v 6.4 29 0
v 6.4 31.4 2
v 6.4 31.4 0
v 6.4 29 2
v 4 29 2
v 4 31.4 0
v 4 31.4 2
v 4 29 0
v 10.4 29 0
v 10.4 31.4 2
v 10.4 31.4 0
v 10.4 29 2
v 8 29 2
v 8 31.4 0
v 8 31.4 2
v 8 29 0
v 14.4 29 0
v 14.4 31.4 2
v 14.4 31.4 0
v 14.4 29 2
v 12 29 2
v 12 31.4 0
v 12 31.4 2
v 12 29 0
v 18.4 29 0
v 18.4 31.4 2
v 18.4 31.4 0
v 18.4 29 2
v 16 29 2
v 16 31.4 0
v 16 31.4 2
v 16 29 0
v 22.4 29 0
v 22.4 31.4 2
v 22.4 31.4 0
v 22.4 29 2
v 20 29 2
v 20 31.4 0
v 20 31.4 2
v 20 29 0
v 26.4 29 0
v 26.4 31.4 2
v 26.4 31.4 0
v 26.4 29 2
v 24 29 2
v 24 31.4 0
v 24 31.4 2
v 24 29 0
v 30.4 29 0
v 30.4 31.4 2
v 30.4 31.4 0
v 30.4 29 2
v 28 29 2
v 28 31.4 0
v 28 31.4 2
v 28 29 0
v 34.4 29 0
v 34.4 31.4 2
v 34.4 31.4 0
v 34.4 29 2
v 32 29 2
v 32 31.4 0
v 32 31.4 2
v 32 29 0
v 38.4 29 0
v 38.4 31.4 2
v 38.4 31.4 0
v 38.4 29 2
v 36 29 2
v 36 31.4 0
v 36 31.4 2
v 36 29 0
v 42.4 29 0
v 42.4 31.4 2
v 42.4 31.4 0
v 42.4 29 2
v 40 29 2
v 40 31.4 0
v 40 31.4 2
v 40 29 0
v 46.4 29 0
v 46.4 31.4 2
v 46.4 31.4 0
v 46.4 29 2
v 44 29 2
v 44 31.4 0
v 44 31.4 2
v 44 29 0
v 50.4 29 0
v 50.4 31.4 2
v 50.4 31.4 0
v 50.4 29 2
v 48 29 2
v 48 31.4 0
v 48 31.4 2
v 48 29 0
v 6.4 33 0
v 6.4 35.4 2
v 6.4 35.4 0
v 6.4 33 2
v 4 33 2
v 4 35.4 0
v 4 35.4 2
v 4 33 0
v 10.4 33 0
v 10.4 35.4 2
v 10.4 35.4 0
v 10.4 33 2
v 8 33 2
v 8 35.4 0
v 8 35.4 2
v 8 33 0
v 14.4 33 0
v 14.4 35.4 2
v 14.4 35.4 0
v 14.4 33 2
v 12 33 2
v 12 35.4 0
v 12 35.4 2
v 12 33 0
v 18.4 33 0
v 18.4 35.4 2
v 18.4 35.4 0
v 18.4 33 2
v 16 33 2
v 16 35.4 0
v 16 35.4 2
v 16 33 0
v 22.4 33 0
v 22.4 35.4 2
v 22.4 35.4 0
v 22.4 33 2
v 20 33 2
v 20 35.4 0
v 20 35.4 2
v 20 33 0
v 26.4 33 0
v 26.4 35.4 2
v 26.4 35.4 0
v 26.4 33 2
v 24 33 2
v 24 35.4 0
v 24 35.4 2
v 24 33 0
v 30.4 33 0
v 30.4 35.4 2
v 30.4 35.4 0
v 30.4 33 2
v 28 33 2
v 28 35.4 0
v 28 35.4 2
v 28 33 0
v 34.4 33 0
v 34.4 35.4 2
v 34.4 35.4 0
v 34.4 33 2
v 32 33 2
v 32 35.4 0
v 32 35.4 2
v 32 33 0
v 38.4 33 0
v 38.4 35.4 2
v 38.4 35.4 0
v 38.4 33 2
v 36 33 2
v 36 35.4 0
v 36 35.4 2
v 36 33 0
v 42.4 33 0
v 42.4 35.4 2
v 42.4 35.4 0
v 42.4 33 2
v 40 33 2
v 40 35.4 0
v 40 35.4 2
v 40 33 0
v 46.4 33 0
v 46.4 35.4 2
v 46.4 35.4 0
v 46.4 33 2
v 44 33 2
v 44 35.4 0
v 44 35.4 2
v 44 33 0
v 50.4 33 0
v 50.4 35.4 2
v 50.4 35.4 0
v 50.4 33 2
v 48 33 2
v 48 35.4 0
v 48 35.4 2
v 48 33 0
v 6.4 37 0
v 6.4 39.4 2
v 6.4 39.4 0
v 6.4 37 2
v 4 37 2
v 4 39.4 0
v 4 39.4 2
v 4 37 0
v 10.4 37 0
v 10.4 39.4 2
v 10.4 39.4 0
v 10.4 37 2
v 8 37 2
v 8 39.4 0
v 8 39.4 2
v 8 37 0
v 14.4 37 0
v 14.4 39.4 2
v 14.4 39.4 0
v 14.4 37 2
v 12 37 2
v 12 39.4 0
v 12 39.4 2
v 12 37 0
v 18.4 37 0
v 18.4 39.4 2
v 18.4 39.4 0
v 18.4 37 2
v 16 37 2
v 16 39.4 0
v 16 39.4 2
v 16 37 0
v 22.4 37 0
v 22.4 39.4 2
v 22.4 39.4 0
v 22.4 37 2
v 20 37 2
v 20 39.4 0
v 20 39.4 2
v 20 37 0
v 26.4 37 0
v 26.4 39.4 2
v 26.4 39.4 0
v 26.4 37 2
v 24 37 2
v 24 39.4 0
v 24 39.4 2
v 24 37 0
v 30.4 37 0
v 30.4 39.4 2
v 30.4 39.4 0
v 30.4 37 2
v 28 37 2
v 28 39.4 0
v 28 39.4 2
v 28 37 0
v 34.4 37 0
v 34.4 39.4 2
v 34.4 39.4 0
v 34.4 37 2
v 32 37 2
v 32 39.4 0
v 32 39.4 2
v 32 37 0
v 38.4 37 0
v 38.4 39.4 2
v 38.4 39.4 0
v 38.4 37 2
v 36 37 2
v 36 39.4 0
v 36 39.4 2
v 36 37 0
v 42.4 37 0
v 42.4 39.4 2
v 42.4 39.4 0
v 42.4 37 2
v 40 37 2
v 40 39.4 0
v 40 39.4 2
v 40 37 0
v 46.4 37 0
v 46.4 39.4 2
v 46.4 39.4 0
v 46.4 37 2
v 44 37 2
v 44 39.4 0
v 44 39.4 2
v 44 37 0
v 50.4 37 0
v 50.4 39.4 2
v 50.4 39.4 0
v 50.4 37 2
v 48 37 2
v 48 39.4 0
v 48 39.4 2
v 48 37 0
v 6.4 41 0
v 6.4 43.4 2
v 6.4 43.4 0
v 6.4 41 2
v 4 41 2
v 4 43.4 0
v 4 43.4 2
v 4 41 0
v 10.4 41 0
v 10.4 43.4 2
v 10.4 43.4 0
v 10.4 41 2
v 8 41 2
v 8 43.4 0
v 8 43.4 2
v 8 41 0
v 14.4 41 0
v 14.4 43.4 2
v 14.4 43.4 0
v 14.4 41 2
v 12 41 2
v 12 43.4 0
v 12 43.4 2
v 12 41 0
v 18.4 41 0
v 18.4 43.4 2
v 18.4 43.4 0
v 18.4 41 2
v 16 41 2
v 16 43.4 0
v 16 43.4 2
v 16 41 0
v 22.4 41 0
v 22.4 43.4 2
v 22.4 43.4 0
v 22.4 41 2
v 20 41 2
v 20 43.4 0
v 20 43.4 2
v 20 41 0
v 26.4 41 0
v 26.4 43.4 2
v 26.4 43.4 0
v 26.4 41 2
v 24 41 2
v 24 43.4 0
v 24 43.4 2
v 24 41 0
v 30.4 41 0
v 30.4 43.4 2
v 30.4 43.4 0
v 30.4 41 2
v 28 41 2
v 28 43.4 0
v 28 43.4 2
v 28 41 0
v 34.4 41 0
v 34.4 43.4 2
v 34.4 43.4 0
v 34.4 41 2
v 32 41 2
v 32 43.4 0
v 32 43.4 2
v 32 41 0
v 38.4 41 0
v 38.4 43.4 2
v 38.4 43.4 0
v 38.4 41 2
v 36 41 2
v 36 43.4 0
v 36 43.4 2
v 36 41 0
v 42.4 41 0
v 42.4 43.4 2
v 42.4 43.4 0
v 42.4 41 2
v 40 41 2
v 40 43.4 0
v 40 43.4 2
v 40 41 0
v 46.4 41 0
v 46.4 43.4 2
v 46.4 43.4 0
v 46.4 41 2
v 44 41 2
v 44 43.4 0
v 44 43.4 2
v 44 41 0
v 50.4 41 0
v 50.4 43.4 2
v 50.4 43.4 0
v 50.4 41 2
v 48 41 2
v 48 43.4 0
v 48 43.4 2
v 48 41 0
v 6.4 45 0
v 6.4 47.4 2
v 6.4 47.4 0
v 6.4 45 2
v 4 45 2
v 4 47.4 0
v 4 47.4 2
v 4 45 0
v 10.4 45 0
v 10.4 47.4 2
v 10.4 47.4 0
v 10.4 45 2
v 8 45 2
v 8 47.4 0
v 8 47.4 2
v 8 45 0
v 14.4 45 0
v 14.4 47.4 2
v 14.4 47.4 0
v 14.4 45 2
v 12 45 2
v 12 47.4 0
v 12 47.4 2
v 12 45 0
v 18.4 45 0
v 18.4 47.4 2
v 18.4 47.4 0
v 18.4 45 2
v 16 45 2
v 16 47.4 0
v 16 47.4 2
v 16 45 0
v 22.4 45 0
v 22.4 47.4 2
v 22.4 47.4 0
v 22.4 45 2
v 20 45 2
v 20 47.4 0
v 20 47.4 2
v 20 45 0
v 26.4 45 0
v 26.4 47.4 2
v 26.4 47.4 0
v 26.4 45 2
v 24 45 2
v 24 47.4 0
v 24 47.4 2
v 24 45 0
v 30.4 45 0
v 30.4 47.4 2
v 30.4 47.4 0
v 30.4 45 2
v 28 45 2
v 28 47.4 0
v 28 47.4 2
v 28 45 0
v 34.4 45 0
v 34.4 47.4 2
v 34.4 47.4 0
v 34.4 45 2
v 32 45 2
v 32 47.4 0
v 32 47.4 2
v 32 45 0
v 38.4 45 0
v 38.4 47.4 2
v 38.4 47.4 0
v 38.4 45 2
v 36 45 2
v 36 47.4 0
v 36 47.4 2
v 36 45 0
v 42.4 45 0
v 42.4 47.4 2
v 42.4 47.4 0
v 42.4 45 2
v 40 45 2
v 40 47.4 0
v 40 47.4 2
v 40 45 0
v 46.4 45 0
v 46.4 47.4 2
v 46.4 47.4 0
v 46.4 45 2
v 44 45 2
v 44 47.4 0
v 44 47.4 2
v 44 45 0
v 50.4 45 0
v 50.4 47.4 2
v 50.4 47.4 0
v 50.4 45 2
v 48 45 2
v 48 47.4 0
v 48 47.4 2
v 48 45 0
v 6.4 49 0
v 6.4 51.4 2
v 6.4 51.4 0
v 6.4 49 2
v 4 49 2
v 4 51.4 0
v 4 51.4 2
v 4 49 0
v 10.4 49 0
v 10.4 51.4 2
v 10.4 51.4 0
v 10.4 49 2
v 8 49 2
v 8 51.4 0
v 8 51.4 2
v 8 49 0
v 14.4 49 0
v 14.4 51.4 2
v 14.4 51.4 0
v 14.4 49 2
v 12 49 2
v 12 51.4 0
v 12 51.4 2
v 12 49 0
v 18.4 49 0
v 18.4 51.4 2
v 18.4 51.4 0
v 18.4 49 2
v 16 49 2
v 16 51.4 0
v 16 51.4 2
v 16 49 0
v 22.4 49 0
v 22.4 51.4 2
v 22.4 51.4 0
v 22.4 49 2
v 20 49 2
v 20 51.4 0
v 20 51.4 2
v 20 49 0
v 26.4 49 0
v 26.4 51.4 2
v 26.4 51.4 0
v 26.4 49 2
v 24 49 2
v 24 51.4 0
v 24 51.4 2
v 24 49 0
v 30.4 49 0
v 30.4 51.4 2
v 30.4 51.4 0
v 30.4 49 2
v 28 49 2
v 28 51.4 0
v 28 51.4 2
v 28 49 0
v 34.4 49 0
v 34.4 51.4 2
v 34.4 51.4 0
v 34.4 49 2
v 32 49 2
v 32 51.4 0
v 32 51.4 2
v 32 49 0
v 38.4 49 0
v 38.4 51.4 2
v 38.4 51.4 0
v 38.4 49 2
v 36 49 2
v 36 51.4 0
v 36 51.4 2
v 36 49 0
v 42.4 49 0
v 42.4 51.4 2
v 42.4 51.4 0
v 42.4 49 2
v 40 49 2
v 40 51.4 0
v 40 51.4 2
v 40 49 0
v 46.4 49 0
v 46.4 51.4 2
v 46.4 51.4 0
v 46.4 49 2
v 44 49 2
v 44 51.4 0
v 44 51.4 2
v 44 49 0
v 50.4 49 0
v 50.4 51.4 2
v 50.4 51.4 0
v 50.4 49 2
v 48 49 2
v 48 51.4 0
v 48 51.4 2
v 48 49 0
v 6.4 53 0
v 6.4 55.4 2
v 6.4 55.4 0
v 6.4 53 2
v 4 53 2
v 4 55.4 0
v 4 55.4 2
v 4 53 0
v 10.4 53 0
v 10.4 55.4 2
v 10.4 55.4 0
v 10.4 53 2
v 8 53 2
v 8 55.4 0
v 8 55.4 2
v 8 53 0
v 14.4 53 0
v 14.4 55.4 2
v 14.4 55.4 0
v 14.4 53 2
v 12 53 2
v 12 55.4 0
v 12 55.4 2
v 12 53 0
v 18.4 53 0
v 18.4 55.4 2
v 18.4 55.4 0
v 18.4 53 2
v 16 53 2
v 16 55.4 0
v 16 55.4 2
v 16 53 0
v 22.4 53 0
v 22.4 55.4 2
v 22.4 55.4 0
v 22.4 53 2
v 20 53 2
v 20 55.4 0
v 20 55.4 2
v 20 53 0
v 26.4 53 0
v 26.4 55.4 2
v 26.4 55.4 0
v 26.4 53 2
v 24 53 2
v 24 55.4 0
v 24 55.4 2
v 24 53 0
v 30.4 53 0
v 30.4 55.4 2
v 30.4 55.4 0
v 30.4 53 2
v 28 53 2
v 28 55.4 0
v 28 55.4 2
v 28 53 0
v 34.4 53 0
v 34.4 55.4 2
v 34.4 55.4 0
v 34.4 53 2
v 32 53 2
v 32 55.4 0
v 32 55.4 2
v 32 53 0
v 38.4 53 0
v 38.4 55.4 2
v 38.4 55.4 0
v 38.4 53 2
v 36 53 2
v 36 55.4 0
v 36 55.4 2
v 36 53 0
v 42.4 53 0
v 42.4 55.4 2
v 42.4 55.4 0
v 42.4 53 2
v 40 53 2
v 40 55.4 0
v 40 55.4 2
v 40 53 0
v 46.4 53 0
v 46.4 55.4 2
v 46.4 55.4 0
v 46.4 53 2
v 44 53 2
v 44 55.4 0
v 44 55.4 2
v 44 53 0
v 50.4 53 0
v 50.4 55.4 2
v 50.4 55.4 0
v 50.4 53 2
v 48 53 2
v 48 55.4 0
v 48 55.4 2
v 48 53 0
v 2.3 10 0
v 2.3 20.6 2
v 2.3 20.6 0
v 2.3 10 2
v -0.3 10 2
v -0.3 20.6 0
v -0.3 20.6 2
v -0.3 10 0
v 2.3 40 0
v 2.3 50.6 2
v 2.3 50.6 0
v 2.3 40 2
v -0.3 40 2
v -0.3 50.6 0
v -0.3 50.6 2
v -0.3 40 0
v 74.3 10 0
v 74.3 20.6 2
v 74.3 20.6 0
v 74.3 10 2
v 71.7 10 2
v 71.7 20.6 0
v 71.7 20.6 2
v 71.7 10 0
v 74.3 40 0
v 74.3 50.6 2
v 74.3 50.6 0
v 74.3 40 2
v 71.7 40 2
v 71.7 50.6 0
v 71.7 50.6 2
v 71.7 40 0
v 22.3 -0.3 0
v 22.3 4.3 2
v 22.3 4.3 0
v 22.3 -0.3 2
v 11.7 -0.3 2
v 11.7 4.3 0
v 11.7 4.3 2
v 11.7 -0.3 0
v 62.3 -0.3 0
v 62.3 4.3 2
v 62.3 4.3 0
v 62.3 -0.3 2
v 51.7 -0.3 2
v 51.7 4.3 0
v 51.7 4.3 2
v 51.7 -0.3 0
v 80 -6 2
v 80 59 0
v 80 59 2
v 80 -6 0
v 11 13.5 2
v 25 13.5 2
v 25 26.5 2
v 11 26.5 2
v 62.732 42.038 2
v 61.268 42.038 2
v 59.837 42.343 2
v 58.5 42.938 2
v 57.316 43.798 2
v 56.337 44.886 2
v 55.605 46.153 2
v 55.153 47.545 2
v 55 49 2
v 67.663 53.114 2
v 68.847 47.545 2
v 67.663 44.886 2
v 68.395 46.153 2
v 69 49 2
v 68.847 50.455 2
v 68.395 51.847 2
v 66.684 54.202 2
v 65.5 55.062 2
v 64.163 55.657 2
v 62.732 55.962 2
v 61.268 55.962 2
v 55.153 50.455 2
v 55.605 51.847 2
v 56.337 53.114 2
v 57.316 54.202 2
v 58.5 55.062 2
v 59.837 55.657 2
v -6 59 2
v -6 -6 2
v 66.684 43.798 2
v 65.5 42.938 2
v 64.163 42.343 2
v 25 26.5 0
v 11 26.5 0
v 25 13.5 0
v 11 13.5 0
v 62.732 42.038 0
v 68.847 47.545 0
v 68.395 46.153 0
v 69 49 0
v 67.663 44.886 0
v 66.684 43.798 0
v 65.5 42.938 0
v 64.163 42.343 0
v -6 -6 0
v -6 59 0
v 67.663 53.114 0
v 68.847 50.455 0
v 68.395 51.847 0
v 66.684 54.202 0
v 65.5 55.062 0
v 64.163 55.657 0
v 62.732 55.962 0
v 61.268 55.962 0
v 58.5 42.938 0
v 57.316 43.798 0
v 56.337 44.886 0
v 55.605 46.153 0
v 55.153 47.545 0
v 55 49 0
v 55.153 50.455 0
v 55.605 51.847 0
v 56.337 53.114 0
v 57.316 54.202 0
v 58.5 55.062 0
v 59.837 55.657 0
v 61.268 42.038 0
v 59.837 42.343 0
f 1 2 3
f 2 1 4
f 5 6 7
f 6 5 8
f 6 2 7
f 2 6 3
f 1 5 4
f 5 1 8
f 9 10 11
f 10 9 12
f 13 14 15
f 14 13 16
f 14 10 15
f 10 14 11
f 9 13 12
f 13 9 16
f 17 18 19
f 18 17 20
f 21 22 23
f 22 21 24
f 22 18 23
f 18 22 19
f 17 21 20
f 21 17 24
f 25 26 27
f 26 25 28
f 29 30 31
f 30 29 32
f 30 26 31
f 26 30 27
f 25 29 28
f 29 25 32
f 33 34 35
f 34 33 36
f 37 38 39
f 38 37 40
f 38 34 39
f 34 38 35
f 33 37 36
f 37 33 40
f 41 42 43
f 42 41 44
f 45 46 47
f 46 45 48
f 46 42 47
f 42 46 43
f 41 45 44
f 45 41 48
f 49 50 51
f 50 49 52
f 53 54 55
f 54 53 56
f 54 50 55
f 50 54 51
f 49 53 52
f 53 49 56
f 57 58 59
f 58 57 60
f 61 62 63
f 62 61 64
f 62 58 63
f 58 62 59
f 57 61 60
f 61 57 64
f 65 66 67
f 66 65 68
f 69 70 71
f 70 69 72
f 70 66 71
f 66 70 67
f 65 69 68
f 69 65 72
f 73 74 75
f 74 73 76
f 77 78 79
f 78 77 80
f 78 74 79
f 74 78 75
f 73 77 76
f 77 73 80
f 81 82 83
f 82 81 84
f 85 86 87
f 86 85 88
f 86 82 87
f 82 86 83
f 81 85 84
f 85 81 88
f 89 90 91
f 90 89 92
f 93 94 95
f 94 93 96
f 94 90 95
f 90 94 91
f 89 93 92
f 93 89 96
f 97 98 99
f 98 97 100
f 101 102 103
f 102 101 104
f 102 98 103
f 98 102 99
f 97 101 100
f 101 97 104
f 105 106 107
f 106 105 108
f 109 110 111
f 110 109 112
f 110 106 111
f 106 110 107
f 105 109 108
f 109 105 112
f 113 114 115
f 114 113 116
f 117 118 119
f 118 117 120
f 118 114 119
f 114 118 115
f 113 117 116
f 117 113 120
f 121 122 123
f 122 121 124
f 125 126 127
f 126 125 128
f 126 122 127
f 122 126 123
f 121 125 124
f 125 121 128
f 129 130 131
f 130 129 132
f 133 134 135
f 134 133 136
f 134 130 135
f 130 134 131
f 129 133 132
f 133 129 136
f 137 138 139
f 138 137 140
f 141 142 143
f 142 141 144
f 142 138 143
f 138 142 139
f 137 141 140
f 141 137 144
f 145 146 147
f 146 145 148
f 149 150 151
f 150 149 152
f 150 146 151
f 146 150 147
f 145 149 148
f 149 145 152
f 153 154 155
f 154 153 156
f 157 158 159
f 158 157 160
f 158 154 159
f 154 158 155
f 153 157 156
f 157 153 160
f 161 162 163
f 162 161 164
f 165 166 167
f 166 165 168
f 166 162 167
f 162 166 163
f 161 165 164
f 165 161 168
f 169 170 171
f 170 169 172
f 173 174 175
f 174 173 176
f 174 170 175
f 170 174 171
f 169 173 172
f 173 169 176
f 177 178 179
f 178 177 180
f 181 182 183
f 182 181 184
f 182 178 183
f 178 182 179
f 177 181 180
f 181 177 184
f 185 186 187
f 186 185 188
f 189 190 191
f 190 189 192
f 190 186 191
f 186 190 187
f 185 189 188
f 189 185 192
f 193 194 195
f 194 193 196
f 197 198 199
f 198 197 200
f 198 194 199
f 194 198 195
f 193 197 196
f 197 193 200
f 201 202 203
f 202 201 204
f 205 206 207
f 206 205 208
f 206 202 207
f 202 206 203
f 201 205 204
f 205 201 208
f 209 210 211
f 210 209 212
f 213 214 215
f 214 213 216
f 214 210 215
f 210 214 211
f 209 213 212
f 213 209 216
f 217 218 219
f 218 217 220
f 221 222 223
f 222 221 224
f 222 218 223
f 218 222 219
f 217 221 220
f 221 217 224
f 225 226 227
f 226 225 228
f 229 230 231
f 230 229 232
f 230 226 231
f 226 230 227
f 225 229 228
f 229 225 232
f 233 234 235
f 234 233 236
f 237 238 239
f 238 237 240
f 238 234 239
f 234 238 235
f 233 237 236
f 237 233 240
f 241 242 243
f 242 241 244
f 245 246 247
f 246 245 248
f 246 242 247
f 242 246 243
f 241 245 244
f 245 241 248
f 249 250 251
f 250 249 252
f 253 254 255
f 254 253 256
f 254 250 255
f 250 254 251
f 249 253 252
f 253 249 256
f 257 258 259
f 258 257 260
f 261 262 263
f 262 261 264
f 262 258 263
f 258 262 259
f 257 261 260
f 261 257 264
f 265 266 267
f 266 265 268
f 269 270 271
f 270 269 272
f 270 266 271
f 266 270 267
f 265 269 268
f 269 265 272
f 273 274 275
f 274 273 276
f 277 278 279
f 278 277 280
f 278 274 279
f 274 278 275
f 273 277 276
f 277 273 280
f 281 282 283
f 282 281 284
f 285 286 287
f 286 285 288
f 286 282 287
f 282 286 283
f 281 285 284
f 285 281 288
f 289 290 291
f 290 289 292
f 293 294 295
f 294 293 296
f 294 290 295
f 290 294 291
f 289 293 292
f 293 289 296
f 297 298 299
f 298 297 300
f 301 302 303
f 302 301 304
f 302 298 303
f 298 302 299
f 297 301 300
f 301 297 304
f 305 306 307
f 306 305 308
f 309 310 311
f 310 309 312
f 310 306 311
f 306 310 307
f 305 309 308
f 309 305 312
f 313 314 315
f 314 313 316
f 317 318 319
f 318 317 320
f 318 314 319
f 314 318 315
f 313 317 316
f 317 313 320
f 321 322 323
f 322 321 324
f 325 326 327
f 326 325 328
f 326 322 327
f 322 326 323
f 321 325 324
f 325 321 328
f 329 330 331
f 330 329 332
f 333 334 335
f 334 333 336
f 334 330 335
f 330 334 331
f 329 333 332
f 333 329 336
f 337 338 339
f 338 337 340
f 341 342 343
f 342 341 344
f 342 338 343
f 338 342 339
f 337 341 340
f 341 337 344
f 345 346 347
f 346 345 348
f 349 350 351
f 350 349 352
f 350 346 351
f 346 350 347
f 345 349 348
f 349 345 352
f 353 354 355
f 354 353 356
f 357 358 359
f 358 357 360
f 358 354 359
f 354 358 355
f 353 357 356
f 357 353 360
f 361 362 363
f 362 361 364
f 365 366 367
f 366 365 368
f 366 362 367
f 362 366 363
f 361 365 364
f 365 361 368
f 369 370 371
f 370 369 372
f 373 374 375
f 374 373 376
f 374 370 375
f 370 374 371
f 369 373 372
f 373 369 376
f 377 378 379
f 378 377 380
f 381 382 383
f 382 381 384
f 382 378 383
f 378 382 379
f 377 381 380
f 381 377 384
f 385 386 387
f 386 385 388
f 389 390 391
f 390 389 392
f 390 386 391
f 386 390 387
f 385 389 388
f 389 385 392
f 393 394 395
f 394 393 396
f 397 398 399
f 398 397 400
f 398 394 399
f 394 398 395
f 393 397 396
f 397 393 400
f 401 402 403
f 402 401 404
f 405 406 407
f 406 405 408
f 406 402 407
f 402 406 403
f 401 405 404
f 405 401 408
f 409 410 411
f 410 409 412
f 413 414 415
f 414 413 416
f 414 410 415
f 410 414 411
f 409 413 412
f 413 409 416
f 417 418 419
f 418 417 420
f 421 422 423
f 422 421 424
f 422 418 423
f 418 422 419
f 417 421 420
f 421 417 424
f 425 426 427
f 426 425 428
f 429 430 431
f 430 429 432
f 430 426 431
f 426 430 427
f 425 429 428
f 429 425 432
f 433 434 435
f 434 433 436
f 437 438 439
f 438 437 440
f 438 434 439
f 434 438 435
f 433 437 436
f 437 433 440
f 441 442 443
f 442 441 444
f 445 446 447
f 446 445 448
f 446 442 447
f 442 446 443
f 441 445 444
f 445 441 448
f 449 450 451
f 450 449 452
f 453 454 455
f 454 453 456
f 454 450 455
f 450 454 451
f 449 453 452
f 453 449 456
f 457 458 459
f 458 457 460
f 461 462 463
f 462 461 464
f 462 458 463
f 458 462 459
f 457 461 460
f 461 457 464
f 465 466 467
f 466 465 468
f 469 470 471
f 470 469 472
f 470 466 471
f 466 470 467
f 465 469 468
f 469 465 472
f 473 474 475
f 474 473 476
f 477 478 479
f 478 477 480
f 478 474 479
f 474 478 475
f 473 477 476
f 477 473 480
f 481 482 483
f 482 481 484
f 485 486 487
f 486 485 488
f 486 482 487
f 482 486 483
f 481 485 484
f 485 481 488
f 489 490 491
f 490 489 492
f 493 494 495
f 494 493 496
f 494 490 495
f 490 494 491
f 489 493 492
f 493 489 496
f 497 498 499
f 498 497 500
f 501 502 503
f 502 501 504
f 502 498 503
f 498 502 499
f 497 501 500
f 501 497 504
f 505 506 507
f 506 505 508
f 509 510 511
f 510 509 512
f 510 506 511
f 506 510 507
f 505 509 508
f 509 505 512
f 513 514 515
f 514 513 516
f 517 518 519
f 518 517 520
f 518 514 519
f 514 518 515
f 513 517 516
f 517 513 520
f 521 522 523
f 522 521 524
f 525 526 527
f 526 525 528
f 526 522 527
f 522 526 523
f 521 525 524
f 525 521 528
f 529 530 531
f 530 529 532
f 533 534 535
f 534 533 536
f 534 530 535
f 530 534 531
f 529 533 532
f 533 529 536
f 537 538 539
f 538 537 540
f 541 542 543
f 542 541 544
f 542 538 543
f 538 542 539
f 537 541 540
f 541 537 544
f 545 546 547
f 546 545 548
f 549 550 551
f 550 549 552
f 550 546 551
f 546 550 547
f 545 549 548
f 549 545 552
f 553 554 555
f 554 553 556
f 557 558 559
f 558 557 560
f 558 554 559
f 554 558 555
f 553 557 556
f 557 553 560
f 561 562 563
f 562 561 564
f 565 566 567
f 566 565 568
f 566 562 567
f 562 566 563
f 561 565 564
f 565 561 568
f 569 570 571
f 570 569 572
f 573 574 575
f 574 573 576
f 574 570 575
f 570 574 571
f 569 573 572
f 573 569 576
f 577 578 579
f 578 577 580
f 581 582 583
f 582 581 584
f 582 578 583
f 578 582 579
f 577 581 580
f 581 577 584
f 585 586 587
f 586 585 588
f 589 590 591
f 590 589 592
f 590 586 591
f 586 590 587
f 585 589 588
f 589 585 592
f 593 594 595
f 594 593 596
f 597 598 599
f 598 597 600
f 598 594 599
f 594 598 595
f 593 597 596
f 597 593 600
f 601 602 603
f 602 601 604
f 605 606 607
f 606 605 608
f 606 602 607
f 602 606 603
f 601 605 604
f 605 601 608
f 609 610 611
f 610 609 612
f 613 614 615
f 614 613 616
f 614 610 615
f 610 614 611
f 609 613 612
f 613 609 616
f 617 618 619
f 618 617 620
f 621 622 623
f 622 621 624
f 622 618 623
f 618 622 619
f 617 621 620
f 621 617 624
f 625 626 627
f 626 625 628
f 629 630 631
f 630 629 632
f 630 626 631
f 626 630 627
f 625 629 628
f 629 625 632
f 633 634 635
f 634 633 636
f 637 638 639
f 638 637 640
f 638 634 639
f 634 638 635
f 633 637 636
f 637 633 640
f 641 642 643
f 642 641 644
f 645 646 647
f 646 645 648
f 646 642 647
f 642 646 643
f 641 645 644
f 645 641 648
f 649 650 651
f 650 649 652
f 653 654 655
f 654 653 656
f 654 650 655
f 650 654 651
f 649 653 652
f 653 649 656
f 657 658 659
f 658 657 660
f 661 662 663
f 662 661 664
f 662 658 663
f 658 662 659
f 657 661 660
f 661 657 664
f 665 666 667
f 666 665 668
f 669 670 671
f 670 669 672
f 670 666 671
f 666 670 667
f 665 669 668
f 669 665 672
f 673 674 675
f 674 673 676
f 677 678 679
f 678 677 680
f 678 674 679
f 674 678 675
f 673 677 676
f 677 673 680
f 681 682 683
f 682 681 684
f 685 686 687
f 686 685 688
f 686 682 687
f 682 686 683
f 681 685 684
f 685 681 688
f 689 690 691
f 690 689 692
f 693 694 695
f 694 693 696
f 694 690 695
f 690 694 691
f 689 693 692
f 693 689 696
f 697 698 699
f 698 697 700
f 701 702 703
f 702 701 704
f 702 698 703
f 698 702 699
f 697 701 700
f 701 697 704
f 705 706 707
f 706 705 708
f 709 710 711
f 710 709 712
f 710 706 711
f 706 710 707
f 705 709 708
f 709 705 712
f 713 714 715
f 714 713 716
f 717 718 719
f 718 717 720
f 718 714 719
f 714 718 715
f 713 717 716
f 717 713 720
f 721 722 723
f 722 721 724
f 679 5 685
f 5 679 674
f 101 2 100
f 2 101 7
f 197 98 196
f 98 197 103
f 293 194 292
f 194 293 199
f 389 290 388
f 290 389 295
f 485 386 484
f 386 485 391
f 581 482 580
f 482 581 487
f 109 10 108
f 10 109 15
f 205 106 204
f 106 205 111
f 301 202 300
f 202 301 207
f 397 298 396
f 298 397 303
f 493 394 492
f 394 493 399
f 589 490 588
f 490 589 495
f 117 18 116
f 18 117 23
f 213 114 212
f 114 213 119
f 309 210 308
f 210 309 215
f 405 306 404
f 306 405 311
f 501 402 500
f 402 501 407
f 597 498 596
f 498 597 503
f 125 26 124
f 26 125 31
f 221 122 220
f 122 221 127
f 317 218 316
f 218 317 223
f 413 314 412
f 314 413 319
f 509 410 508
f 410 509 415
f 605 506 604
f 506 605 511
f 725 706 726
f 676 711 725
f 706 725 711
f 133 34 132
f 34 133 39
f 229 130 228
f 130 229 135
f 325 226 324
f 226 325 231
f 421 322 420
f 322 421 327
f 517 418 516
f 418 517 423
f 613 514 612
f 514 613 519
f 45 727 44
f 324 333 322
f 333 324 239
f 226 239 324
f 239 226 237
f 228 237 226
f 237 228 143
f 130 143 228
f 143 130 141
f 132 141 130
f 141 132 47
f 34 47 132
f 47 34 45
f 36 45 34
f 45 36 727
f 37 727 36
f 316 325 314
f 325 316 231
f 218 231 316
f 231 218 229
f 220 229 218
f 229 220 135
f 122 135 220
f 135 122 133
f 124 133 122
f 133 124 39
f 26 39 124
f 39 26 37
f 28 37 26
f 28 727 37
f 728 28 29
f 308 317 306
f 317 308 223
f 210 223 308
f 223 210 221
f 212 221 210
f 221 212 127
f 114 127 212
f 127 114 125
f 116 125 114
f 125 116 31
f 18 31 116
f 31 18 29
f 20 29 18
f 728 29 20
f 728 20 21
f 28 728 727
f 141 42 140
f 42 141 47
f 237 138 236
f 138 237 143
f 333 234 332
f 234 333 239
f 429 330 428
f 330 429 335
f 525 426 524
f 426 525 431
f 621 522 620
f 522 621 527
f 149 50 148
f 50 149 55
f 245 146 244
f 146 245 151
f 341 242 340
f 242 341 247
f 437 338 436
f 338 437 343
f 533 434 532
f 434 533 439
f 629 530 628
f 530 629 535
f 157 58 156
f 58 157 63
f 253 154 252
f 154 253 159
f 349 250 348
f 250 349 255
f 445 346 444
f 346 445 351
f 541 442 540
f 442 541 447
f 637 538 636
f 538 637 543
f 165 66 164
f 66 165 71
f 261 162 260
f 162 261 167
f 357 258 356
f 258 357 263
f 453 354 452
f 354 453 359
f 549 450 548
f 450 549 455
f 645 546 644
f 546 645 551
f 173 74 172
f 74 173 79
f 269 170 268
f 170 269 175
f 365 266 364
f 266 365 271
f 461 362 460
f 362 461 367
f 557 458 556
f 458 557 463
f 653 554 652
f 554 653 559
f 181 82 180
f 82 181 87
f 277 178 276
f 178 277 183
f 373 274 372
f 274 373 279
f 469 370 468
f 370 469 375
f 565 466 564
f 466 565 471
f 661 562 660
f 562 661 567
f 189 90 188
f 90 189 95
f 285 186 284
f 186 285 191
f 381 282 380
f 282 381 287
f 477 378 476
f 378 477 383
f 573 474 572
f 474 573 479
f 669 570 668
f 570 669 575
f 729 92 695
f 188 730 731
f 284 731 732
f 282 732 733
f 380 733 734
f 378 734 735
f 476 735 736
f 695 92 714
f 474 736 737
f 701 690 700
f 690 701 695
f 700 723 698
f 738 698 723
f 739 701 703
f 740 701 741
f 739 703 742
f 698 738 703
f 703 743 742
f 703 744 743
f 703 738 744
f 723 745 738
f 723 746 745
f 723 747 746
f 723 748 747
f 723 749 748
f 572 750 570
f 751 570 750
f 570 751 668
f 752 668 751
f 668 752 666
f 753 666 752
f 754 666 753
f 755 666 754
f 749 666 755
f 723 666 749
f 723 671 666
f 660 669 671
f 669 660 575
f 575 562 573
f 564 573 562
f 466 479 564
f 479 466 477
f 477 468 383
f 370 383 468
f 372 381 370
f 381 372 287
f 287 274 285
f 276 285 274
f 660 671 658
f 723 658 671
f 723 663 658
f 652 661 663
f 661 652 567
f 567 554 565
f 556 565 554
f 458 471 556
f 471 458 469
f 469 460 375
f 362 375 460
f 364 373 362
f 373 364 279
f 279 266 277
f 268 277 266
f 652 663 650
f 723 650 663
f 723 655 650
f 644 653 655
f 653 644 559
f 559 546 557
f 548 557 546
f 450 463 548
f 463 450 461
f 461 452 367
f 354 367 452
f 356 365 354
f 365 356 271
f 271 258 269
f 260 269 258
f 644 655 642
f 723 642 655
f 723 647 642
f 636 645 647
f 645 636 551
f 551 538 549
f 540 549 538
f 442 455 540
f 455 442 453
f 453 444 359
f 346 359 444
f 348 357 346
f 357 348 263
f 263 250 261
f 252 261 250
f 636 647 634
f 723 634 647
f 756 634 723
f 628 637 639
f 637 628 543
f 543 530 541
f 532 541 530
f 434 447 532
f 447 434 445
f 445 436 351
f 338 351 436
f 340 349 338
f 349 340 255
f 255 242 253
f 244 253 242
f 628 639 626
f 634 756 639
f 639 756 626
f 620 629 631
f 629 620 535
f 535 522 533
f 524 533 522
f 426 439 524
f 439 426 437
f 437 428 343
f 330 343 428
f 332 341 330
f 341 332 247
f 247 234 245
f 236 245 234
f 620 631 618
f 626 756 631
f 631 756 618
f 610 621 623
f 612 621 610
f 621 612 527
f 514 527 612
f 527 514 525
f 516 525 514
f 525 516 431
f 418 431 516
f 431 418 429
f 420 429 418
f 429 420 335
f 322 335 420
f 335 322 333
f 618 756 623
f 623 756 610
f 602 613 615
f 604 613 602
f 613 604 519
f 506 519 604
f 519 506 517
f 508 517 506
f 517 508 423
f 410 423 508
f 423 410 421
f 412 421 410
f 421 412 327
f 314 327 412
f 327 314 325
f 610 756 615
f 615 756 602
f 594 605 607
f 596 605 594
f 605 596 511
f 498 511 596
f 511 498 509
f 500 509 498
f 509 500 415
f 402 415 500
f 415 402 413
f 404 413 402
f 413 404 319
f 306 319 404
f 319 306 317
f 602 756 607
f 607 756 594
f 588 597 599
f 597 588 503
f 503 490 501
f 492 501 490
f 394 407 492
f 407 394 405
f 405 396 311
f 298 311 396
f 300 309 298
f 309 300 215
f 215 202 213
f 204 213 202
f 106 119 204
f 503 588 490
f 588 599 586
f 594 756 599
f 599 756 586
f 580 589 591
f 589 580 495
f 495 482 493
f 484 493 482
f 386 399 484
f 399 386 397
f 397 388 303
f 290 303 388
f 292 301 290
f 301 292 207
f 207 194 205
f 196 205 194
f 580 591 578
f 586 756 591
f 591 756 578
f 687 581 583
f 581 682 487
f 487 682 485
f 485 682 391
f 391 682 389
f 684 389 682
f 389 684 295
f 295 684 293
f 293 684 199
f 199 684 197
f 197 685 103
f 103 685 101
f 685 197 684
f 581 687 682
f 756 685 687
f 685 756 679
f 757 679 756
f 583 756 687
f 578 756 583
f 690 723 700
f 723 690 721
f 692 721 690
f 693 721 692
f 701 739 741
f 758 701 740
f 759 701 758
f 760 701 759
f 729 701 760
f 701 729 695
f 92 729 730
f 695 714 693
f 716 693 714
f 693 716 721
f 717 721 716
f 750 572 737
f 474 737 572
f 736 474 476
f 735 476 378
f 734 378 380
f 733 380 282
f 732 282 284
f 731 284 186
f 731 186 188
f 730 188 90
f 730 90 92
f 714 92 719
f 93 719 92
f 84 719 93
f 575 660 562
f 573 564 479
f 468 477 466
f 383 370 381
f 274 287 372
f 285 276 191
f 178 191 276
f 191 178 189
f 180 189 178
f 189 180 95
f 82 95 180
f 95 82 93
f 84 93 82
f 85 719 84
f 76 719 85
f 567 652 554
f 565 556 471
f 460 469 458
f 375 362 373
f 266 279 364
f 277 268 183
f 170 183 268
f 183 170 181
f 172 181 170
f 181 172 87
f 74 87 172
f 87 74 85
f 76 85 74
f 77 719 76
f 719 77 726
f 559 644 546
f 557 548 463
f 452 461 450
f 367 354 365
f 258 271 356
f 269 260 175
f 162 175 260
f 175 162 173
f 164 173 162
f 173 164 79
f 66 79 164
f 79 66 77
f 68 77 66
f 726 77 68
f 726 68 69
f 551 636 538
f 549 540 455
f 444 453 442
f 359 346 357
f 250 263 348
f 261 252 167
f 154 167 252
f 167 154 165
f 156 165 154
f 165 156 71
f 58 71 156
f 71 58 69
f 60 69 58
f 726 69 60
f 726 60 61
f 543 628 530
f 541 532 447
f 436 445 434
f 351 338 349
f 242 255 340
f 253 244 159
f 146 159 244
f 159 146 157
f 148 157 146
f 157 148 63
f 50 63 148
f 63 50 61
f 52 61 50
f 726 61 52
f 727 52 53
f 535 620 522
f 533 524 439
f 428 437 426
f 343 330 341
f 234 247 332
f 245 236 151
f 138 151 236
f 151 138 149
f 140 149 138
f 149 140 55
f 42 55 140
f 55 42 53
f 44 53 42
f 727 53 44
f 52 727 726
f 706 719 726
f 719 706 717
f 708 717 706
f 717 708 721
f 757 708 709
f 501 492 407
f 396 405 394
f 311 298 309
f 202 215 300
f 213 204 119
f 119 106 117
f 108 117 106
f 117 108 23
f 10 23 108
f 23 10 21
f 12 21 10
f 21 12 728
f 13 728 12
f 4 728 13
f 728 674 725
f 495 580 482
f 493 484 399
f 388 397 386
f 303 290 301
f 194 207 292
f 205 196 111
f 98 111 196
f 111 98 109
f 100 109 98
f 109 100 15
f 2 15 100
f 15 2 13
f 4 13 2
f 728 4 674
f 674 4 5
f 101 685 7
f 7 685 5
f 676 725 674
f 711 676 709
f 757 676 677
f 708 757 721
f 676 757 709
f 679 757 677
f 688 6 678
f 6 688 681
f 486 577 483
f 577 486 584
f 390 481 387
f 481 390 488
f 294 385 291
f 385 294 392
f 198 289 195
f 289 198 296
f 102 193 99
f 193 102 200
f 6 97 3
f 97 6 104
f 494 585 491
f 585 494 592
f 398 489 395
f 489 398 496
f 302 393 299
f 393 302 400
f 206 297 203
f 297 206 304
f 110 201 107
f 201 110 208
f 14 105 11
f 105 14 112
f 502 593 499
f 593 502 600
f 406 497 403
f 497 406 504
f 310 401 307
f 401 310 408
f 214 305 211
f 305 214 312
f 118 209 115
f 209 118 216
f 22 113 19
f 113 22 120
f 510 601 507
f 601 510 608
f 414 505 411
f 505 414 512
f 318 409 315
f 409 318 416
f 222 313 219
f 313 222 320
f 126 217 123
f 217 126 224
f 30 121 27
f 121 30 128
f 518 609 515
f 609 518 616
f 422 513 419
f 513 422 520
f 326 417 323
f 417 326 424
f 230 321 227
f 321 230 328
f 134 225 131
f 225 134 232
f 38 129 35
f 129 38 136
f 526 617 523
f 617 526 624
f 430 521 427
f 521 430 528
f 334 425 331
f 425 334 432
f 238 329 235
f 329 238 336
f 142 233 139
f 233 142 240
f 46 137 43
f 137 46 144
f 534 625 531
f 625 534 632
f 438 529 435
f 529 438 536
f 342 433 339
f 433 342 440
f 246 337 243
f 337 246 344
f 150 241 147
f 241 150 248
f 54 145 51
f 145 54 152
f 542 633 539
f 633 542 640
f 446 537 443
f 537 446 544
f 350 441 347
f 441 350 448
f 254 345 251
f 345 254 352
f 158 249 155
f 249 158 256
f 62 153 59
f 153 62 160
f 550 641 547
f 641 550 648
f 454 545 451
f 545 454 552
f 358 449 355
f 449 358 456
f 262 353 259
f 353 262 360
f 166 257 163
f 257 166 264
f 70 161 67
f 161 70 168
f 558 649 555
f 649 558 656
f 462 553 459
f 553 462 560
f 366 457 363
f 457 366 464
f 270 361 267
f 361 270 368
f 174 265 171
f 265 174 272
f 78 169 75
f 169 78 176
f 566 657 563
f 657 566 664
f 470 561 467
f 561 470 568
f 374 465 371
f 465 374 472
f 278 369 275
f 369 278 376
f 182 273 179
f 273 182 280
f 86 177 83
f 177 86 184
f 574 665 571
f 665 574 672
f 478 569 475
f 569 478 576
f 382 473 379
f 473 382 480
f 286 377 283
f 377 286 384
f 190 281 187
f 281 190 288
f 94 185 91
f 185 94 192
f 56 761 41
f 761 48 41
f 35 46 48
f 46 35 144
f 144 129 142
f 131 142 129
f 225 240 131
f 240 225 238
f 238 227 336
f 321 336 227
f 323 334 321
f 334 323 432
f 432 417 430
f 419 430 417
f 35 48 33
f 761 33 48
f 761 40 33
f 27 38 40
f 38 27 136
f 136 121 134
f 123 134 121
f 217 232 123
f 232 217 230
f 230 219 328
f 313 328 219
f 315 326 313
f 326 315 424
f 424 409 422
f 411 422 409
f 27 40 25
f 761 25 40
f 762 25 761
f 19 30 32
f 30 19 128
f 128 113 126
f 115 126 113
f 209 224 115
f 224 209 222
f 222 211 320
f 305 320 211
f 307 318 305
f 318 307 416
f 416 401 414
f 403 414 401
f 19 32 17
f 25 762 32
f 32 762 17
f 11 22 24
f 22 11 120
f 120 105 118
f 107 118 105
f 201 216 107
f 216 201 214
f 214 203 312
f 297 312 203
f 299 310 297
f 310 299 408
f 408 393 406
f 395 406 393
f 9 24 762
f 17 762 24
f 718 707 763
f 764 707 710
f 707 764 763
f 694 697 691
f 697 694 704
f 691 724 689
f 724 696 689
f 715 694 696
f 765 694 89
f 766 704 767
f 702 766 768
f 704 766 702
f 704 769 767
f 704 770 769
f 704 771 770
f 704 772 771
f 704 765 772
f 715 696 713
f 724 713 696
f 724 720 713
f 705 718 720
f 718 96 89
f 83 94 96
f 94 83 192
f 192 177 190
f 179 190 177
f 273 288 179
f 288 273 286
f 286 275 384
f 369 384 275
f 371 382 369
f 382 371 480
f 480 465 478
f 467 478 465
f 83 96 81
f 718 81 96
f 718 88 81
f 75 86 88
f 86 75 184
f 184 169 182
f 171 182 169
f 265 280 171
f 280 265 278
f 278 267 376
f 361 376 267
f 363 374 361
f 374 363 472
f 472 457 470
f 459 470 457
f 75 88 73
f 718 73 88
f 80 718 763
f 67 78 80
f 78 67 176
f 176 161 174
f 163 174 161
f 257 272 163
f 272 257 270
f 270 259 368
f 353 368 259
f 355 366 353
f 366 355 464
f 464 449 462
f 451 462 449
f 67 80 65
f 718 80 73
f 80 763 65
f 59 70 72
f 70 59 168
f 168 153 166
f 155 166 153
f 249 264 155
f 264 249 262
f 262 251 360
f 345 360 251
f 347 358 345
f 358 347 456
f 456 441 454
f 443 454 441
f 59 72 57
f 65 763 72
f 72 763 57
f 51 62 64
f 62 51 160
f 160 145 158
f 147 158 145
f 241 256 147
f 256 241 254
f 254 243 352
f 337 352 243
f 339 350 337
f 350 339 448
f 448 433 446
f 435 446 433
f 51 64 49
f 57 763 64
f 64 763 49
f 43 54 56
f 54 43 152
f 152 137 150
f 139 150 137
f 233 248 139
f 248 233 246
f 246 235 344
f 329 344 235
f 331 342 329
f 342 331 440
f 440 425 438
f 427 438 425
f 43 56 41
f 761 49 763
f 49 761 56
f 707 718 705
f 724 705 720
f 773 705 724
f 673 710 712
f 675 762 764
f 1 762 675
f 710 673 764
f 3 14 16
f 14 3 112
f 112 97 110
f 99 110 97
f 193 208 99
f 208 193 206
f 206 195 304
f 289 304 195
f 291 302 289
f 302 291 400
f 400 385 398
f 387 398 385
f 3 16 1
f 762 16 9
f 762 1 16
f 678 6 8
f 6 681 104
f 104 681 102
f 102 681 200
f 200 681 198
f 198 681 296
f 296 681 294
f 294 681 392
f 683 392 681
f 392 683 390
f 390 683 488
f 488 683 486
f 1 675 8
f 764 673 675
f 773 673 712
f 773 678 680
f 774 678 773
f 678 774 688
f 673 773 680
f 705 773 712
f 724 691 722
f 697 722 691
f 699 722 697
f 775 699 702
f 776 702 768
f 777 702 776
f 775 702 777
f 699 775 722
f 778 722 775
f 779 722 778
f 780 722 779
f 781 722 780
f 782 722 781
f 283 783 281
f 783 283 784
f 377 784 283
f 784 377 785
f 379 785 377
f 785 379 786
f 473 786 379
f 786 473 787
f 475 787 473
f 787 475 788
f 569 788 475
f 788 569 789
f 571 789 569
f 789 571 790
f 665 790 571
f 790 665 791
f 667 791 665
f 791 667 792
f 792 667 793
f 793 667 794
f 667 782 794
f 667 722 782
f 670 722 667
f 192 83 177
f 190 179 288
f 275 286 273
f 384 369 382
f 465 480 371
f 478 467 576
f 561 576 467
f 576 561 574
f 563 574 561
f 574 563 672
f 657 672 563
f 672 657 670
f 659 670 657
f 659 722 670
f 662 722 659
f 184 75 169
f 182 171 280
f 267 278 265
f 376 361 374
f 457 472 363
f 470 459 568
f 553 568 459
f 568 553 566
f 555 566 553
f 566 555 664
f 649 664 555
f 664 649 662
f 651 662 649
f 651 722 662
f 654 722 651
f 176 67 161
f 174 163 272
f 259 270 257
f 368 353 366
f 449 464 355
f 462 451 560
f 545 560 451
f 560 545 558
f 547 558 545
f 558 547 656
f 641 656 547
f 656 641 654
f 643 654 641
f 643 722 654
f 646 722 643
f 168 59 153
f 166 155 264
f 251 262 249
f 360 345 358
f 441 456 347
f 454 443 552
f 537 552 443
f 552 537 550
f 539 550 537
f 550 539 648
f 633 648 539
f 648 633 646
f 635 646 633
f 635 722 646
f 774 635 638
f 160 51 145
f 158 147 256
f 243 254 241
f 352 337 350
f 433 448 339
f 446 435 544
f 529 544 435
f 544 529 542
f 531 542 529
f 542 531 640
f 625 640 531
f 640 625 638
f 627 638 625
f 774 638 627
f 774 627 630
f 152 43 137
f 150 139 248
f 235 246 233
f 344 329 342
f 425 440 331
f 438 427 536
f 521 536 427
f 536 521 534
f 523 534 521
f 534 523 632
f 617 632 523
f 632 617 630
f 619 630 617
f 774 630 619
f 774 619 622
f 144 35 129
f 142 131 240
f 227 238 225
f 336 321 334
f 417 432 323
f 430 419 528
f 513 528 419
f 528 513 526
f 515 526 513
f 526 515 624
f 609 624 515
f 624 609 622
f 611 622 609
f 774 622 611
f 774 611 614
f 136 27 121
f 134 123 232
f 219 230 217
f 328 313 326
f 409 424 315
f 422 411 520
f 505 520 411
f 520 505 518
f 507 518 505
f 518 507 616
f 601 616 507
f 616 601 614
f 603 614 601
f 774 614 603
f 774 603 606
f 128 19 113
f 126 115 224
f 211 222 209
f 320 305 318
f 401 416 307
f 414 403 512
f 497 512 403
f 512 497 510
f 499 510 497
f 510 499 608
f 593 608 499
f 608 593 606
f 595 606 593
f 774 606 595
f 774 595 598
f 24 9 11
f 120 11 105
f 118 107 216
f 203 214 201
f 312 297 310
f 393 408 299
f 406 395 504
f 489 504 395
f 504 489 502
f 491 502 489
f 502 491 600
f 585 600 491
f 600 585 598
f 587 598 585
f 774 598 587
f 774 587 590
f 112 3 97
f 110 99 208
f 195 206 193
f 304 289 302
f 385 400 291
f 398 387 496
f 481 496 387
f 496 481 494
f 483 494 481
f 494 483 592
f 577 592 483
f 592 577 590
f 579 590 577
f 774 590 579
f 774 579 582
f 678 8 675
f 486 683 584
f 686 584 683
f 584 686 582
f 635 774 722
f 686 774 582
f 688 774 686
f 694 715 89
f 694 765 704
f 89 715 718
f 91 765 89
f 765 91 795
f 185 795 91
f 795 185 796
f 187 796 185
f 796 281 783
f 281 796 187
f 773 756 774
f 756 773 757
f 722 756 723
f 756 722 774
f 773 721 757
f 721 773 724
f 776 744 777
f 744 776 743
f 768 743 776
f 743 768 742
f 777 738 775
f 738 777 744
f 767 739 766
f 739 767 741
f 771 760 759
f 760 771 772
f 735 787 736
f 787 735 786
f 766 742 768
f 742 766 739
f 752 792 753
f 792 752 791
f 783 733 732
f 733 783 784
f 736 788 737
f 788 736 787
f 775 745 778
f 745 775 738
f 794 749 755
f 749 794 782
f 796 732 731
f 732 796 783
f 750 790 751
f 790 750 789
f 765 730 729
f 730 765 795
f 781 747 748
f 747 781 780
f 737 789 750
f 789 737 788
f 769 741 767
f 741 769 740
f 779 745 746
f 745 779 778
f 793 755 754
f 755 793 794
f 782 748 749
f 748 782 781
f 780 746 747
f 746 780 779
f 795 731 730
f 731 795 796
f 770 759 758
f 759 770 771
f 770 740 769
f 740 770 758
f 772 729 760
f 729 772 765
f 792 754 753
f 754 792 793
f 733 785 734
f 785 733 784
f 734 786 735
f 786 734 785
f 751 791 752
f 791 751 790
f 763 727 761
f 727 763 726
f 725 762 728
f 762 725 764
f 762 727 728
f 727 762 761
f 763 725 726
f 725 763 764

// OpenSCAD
include <whole_case.scad>

translate([0,0,-height-wall]) top_panel();
